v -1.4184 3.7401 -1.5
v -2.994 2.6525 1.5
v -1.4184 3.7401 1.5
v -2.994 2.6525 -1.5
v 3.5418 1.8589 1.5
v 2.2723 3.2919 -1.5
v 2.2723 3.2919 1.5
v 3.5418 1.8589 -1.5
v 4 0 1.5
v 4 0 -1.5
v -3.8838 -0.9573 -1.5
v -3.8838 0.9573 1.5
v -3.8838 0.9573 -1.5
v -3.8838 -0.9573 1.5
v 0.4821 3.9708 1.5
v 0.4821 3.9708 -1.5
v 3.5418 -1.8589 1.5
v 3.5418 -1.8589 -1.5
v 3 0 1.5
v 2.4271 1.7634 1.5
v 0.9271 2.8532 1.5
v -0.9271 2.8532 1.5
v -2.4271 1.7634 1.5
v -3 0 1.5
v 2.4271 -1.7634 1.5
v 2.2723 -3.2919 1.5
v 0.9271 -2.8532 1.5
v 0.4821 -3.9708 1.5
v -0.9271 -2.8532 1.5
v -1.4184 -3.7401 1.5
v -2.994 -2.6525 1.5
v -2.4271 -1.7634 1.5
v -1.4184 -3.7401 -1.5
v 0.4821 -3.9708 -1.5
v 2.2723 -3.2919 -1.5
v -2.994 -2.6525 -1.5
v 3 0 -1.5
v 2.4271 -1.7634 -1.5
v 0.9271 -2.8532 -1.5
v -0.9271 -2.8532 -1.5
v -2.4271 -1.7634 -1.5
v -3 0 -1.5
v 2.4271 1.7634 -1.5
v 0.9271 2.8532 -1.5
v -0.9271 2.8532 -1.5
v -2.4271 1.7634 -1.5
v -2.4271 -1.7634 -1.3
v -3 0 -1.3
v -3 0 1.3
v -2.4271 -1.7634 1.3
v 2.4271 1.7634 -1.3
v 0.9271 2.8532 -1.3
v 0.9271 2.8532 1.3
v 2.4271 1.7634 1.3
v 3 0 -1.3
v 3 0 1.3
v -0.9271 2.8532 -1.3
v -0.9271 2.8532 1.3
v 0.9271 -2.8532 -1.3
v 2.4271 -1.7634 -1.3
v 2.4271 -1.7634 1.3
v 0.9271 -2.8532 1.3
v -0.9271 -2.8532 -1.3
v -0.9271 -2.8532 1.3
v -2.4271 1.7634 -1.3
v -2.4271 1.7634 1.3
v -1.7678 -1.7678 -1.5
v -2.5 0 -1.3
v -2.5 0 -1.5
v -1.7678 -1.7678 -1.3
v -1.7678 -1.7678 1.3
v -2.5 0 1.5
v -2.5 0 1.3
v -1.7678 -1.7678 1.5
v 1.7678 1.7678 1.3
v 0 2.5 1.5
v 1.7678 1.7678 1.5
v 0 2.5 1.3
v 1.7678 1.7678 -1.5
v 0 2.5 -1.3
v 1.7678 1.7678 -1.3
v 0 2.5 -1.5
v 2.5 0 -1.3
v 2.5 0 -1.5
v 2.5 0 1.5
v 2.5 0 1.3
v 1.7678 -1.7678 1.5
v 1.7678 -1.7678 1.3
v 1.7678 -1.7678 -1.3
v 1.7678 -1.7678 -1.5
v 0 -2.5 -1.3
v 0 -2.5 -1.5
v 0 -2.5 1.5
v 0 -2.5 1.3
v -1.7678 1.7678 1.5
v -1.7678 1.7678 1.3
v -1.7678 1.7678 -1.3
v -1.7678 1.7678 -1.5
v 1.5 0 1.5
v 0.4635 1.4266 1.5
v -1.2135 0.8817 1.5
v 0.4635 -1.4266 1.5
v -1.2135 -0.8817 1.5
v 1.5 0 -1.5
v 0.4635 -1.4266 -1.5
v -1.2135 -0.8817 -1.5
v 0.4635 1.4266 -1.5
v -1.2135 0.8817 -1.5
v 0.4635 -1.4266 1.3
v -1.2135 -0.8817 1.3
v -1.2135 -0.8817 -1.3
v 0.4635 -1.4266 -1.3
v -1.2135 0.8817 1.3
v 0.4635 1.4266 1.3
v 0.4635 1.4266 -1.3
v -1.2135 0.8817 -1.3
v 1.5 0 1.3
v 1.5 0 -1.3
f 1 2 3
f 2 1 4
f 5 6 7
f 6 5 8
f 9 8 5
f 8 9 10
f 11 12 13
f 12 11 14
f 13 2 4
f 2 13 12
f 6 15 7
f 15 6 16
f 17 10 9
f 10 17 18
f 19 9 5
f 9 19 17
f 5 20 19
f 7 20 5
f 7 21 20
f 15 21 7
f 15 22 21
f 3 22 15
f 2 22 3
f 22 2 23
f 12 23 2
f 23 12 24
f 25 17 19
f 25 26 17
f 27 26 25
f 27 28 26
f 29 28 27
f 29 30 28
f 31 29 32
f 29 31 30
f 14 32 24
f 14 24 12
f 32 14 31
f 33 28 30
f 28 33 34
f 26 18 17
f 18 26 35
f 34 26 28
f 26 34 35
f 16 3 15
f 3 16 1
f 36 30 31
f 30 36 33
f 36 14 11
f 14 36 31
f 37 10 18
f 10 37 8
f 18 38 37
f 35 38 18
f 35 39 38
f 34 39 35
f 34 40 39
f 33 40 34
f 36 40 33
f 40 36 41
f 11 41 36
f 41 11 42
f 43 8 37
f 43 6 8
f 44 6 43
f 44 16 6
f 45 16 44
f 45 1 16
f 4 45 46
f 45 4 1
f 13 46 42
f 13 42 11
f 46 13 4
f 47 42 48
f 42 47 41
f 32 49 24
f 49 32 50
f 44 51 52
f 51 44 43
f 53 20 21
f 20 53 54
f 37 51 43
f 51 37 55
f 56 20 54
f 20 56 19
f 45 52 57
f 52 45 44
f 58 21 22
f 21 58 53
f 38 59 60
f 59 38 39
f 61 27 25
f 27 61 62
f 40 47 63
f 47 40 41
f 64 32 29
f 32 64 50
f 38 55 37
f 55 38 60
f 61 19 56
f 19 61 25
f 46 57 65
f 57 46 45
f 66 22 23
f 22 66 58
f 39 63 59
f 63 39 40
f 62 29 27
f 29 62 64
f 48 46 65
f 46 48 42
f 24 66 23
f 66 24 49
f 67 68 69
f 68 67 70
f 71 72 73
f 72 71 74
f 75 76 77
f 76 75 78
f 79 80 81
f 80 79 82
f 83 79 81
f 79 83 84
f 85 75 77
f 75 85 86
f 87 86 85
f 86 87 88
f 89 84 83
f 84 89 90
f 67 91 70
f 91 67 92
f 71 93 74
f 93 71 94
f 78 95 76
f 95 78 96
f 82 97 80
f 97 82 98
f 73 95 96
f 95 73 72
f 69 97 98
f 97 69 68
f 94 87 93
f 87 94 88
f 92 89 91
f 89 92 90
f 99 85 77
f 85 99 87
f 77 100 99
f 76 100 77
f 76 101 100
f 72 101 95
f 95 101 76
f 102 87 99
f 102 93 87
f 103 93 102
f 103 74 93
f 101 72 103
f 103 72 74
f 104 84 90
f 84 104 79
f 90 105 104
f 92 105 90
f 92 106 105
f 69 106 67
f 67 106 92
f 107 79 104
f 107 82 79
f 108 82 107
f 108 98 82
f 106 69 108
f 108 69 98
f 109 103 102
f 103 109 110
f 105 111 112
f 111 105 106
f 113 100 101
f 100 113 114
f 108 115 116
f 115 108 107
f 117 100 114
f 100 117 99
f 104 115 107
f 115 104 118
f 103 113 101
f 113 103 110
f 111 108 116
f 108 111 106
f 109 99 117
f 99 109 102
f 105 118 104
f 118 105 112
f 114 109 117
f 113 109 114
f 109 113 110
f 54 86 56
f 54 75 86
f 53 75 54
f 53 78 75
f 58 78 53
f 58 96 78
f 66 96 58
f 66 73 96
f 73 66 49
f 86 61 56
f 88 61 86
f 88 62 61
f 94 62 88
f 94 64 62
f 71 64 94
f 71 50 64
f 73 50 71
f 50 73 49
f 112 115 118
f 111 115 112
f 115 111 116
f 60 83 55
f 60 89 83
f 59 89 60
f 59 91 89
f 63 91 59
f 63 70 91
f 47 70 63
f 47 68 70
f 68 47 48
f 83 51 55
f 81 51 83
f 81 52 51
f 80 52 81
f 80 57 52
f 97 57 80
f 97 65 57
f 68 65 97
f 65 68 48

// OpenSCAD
// Parameters
bore_diameter_mm = 3; //[1.5:6:0.1]
outer_diameter_mm = 8; //[4:16:0.1]
width_mm = 3; //[1.5:6:0.1]
ring_radial_thickness_mm = 1; //[0.6:2:0.05]
ball_diameter_mm = 1.2; //[0.6:2:0.05]
ball_count = 8; //[5:14:1]
ball_radial_clearance_mm = 0.15; //[0.05:0.4:0.01]
z_clearance_mm = 0.2; //[0.05:0.6:0.01]
overlap_mm = 0.8; //[0.3:1.5:0.05]

// Bearing Ball - complete geometry
module bearing_ball() {
  color("Silver") {
    sphere(r=ball_diameter_mm/2);
  }
}

// Ball Bearing - complete geometry
module ball_bearing() {
  color("DimGray") {
    // Outer Ring
    difference() {
      cylinder(r=outer_diameter_mm/2, h=width_mm, center=true);
      cylinder(r=outer_diameter_mm/2 - ring_radial_thickness_mm, h=width_mm + 2*overlap_mm, center=true);
    }
    // Inner Ring
    difference() {
      cylinder(r=bore_diameter_mm/2 + ring_radial_thickness_mm, h=width_mm, center=true);
      cylinder(r=bore_diameter_mm/2, h=width_mm + 2*overlap_mm, center=true);
    }
    // Balls
    for (i = [0:ball_count-1]) {
      rotate([0, 0, i*360/ball_count])
      translate([bore_diameter_mm/2 + ring_radial_thickness_mm + ball_radial_clearance_mm + ball_diameter_mm/2, 0, 0])
      bearing_ball();
    }
    // Connector Web
    cylinder(r=bore_diameter_mm/2 + ring_radial_thickness_mm + overlap_mm, h=width_mm - 2*z_clearance_mm, center=true);
  }
}

// Assembly
module assembly() {
  ball_bearing();
}

assembly();
